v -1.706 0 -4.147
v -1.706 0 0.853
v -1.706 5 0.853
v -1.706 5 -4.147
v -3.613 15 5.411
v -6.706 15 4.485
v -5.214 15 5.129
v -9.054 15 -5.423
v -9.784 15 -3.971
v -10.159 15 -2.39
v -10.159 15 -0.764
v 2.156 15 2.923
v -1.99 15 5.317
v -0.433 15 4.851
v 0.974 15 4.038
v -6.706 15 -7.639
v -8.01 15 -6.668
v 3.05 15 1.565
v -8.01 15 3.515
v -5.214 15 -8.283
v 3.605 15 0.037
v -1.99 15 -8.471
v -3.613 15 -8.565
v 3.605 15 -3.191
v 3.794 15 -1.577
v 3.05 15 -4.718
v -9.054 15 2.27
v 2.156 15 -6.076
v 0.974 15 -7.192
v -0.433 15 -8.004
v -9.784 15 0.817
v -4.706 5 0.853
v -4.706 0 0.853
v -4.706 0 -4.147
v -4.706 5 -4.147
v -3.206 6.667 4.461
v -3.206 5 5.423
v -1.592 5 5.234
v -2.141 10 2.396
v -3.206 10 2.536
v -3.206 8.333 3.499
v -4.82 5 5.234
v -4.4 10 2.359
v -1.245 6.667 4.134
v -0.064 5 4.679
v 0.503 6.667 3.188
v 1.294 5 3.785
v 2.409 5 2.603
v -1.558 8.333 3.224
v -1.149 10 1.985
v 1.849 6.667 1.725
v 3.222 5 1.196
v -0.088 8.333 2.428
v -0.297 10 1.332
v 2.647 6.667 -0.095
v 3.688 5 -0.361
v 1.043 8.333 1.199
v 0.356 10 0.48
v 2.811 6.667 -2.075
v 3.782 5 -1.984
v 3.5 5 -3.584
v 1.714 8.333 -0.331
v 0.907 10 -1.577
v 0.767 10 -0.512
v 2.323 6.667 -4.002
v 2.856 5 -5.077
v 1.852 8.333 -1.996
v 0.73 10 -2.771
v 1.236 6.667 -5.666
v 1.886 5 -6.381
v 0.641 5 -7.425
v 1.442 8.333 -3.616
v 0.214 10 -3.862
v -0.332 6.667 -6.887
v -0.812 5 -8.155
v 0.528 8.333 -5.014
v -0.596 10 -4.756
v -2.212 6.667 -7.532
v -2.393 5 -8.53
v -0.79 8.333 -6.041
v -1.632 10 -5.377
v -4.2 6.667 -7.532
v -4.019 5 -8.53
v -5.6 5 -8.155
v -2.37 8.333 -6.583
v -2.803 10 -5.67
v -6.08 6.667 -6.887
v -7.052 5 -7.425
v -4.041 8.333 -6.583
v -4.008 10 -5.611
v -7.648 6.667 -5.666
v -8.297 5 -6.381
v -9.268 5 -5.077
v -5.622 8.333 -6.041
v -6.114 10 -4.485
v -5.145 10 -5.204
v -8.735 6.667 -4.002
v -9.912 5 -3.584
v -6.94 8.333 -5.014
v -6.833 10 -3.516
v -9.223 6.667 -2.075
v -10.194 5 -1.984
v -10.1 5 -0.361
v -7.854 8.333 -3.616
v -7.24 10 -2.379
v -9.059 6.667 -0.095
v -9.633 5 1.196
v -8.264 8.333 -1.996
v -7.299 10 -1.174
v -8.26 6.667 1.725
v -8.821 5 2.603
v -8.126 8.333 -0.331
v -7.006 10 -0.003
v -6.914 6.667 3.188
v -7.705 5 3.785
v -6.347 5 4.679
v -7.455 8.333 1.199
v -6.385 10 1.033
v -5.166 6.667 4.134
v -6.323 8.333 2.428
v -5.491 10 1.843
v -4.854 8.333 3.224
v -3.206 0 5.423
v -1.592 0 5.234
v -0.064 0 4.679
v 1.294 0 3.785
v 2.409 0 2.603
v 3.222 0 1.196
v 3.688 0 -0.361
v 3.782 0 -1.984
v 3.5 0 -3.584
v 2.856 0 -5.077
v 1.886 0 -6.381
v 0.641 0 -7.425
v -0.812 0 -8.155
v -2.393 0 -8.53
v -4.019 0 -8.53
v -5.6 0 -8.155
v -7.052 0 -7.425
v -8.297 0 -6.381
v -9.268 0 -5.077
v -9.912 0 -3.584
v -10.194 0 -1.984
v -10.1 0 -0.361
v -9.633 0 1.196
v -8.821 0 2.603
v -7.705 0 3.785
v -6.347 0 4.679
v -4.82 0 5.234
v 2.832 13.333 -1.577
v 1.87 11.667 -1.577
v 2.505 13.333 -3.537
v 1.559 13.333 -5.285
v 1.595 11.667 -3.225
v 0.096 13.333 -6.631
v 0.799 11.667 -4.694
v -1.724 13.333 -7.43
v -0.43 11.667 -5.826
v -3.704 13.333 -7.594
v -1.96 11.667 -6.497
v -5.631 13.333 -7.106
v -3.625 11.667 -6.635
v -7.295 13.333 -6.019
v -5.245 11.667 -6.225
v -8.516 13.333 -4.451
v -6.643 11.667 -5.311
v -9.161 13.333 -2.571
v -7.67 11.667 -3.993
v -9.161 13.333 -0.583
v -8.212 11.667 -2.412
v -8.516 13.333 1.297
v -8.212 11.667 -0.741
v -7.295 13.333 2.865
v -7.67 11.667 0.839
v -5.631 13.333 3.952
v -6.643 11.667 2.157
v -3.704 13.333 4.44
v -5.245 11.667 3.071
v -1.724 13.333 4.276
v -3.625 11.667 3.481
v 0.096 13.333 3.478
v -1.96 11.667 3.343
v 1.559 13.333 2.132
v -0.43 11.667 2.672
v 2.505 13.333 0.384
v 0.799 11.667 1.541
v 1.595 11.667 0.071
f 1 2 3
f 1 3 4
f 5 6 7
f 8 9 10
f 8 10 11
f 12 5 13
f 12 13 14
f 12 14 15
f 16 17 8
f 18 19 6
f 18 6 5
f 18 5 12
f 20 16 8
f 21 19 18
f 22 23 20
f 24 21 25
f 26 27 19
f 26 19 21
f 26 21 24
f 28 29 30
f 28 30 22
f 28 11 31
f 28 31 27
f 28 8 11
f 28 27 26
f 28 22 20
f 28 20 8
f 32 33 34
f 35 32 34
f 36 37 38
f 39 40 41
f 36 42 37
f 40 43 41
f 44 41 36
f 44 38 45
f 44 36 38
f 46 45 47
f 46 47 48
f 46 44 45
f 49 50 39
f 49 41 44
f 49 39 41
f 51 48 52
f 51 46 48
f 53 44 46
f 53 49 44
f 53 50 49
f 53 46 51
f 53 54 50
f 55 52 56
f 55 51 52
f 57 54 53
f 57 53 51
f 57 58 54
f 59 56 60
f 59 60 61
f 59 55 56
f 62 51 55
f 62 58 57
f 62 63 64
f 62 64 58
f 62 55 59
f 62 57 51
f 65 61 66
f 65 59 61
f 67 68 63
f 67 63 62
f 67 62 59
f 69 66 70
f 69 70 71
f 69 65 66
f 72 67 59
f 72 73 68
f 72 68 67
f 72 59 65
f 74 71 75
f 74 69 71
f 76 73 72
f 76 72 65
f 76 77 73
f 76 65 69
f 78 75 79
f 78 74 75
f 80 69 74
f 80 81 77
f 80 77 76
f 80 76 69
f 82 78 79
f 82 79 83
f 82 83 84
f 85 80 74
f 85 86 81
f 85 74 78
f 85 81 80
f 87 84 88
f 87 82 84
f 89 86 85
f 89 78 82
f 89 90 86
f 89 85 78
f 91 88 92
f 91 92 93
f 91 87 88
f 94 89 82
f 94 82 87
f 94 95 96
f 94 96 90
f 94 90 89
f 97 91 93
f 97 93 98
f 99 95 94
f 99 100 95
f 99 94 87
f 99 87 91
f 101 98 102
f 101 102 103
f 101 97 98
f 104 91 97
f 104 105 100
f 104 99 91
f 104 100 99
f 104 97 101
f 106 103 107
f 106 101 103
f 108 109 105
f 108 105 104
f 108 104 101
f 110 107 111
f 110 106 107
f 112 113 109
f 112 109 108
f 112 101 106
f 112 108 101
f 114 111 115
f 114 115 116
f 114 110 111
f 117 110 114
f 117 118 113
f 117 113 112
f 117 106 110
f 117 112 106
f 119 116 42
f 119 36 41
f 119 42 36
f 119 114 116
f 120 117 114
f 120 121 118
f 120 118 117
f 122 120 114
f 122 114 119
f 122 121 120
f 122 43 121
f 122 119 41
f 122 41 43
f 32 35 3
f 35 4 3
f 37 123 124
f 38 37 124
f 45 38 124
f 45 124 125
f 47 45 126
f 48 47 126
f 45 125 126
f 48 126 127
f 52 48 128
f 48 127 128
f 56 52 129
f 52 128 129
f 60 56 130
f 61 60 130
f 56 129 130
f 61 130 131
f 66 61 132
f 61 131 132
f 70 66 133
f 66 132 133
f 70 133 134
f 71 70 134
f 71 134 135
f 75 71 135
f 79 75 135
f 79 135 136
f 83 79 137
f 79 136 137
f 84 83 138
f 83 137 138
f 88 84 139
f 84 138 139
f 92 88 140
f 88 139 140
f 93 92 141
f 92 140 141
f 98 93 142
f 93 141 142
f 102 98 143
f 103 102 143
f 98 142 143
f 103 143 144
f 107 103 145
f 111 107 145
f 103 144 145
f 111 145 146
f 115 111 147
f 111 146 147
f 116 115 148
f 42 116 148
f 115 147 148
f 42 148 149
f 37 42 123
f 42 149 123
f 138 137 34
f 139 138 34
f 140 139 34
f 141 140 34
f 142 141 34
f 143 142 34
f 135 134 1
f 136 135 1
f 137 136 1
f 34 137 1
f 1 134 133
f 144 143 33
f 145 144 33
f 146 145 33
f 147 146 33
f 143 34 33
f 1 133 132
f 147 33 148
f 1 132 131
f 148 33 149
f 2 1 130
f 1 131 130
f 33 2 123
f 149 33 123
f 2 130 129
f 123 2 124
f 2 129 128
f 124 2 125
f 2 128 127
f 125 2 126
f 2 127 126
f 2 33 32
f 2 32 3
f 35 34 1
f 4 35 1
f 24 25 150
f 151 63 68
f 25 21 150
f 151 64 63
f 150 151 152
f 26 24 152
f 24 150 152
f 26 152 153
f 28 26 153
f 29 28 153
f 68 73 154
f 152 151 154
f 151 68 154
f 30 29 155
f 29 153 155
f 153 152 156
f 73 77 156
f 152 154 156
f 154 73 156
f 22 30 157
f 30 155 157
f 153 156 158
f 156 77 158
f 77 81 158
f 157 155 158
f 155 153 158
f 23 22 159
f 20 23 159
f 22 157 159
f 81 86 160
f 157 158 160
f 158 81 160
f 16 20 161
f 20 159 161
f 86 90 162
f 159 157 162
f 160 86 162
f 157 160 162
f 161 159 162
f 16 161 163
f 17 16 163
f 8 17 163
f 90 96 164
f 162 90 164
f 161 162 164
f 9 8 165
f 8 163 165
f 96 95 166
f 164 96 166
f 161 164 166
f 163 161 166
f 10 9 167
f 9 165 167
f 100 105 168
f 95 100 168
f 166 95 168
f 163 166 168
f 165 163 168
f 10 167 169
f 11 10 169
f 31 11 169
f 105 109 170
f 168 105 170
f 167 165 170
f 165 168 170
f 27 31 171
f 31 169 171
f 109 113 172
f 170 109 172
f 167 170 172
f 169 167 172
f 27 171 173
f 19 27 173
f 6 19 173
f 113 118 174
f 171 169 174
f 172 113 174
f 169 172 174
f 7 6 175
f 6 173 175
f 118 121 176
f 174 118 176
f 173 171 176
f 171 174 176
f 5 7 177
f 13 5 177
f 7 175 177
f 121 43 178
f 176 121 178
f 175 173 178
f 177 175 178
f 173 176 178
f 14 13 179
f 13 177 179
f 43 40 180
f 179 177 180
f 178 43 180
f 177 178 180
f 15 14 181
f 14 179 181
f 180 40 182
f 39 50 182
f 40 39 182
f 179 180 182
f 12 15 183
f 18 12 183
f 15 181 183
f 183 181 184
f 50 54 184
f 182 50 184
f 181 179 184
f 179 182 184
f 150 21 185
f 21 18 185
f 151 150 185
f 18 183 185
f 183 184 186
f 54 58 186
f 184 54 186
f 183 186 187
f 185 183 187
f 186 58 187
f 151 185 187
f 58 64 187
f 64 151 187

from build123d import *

# Parameters (mm, degrees)
SKETCH2_R           = 7
SKETCH2_W           = 3
SKETCH2_H           = 5
BOSS_EXTRUDE1_DEPTH = 5
SKETCH3_R           = 7
BOSS_EXTRUDE2_DEPTH = 5
BOSS_EXTRUDE2_TAPER = 30
SKETCH4_R           = 4.113248654
BOSS_EXTRUDE3_DEPTH = 5
BOSS_EXTRUDE3_DRAFT = -30


with BuildPart() as part:
    # Sketch2 → Boss-Extrude1 (new body)
    with BuildSketch(Plane(origin=(0, 0, 0), x_dir=(1, 0, 0), z_dir=(0, 1, 0))):
        with Locations(Location((-3.205882353, 1.576875202, 0), (0, 0, 270))):
            Circle(SKETCH2_R)
        with Locations((-3.205882353, 1.647058824)):
            Rectangle(SKETCH2_W, SKETCH2_H, mode=Mode.SUBTRACT)
    extrude(amount=BOSS_EXTRUDE1_DEPTH)

    # Sketch3 → Boss-Extrude2 (add)
    with BuildSketch(Plane(origin=(0, 5, 0), x_dir=(1, 0, 0), z_dir=(0, 1, 0))):
        with Locations(Location((-3.205882353, 1.576875202, 0), (0, 0, 270))):
            Circle(SKETCH3_R)
    extrude(amount=BOSS_EXTRUDE2_DEPTH, taper=BOSS_EXTRUDE2_TAPER)


with BuildPart() as boss_extrude3_tool:
    # Sketch4 → Boss-Extrude3 (with draft: the straight prism first)
    with BuildSketch(Plane(origin=(0, 10, 0), x_dir=(1, 0, 0), z_dir=(0, 1, 0))):
        with Locations((-3.205882353, 1.576875202)):
            Circle(SKETCH4_R)
    extrude(amount=BOSS_EXTRUDE3_DEPTH)
    # Boss-Extrude3: the draft: its side faces are tilted about the plane it starts from
    boss_extrude3_sides = [boss_extrude3_tool.faces().sort_by_distance(p)[0] for p in [
        (-7.319131007, 12.5, -1.576875202),
    ]]
    draft(boss_extrude3_sides, Plane(origin=(0, 10, 0), x_dir=(1, 0, 0), z_dir=(0, 1, 0)), BOSS_EXTRUDE3_DRAFT)


with BuildPart() as part_1:
    add(part.part)

    # Boss-Extrude3: add boss_extrude3_tool
    add(boss_extrude3_tool.part)


solid = part_1.part
